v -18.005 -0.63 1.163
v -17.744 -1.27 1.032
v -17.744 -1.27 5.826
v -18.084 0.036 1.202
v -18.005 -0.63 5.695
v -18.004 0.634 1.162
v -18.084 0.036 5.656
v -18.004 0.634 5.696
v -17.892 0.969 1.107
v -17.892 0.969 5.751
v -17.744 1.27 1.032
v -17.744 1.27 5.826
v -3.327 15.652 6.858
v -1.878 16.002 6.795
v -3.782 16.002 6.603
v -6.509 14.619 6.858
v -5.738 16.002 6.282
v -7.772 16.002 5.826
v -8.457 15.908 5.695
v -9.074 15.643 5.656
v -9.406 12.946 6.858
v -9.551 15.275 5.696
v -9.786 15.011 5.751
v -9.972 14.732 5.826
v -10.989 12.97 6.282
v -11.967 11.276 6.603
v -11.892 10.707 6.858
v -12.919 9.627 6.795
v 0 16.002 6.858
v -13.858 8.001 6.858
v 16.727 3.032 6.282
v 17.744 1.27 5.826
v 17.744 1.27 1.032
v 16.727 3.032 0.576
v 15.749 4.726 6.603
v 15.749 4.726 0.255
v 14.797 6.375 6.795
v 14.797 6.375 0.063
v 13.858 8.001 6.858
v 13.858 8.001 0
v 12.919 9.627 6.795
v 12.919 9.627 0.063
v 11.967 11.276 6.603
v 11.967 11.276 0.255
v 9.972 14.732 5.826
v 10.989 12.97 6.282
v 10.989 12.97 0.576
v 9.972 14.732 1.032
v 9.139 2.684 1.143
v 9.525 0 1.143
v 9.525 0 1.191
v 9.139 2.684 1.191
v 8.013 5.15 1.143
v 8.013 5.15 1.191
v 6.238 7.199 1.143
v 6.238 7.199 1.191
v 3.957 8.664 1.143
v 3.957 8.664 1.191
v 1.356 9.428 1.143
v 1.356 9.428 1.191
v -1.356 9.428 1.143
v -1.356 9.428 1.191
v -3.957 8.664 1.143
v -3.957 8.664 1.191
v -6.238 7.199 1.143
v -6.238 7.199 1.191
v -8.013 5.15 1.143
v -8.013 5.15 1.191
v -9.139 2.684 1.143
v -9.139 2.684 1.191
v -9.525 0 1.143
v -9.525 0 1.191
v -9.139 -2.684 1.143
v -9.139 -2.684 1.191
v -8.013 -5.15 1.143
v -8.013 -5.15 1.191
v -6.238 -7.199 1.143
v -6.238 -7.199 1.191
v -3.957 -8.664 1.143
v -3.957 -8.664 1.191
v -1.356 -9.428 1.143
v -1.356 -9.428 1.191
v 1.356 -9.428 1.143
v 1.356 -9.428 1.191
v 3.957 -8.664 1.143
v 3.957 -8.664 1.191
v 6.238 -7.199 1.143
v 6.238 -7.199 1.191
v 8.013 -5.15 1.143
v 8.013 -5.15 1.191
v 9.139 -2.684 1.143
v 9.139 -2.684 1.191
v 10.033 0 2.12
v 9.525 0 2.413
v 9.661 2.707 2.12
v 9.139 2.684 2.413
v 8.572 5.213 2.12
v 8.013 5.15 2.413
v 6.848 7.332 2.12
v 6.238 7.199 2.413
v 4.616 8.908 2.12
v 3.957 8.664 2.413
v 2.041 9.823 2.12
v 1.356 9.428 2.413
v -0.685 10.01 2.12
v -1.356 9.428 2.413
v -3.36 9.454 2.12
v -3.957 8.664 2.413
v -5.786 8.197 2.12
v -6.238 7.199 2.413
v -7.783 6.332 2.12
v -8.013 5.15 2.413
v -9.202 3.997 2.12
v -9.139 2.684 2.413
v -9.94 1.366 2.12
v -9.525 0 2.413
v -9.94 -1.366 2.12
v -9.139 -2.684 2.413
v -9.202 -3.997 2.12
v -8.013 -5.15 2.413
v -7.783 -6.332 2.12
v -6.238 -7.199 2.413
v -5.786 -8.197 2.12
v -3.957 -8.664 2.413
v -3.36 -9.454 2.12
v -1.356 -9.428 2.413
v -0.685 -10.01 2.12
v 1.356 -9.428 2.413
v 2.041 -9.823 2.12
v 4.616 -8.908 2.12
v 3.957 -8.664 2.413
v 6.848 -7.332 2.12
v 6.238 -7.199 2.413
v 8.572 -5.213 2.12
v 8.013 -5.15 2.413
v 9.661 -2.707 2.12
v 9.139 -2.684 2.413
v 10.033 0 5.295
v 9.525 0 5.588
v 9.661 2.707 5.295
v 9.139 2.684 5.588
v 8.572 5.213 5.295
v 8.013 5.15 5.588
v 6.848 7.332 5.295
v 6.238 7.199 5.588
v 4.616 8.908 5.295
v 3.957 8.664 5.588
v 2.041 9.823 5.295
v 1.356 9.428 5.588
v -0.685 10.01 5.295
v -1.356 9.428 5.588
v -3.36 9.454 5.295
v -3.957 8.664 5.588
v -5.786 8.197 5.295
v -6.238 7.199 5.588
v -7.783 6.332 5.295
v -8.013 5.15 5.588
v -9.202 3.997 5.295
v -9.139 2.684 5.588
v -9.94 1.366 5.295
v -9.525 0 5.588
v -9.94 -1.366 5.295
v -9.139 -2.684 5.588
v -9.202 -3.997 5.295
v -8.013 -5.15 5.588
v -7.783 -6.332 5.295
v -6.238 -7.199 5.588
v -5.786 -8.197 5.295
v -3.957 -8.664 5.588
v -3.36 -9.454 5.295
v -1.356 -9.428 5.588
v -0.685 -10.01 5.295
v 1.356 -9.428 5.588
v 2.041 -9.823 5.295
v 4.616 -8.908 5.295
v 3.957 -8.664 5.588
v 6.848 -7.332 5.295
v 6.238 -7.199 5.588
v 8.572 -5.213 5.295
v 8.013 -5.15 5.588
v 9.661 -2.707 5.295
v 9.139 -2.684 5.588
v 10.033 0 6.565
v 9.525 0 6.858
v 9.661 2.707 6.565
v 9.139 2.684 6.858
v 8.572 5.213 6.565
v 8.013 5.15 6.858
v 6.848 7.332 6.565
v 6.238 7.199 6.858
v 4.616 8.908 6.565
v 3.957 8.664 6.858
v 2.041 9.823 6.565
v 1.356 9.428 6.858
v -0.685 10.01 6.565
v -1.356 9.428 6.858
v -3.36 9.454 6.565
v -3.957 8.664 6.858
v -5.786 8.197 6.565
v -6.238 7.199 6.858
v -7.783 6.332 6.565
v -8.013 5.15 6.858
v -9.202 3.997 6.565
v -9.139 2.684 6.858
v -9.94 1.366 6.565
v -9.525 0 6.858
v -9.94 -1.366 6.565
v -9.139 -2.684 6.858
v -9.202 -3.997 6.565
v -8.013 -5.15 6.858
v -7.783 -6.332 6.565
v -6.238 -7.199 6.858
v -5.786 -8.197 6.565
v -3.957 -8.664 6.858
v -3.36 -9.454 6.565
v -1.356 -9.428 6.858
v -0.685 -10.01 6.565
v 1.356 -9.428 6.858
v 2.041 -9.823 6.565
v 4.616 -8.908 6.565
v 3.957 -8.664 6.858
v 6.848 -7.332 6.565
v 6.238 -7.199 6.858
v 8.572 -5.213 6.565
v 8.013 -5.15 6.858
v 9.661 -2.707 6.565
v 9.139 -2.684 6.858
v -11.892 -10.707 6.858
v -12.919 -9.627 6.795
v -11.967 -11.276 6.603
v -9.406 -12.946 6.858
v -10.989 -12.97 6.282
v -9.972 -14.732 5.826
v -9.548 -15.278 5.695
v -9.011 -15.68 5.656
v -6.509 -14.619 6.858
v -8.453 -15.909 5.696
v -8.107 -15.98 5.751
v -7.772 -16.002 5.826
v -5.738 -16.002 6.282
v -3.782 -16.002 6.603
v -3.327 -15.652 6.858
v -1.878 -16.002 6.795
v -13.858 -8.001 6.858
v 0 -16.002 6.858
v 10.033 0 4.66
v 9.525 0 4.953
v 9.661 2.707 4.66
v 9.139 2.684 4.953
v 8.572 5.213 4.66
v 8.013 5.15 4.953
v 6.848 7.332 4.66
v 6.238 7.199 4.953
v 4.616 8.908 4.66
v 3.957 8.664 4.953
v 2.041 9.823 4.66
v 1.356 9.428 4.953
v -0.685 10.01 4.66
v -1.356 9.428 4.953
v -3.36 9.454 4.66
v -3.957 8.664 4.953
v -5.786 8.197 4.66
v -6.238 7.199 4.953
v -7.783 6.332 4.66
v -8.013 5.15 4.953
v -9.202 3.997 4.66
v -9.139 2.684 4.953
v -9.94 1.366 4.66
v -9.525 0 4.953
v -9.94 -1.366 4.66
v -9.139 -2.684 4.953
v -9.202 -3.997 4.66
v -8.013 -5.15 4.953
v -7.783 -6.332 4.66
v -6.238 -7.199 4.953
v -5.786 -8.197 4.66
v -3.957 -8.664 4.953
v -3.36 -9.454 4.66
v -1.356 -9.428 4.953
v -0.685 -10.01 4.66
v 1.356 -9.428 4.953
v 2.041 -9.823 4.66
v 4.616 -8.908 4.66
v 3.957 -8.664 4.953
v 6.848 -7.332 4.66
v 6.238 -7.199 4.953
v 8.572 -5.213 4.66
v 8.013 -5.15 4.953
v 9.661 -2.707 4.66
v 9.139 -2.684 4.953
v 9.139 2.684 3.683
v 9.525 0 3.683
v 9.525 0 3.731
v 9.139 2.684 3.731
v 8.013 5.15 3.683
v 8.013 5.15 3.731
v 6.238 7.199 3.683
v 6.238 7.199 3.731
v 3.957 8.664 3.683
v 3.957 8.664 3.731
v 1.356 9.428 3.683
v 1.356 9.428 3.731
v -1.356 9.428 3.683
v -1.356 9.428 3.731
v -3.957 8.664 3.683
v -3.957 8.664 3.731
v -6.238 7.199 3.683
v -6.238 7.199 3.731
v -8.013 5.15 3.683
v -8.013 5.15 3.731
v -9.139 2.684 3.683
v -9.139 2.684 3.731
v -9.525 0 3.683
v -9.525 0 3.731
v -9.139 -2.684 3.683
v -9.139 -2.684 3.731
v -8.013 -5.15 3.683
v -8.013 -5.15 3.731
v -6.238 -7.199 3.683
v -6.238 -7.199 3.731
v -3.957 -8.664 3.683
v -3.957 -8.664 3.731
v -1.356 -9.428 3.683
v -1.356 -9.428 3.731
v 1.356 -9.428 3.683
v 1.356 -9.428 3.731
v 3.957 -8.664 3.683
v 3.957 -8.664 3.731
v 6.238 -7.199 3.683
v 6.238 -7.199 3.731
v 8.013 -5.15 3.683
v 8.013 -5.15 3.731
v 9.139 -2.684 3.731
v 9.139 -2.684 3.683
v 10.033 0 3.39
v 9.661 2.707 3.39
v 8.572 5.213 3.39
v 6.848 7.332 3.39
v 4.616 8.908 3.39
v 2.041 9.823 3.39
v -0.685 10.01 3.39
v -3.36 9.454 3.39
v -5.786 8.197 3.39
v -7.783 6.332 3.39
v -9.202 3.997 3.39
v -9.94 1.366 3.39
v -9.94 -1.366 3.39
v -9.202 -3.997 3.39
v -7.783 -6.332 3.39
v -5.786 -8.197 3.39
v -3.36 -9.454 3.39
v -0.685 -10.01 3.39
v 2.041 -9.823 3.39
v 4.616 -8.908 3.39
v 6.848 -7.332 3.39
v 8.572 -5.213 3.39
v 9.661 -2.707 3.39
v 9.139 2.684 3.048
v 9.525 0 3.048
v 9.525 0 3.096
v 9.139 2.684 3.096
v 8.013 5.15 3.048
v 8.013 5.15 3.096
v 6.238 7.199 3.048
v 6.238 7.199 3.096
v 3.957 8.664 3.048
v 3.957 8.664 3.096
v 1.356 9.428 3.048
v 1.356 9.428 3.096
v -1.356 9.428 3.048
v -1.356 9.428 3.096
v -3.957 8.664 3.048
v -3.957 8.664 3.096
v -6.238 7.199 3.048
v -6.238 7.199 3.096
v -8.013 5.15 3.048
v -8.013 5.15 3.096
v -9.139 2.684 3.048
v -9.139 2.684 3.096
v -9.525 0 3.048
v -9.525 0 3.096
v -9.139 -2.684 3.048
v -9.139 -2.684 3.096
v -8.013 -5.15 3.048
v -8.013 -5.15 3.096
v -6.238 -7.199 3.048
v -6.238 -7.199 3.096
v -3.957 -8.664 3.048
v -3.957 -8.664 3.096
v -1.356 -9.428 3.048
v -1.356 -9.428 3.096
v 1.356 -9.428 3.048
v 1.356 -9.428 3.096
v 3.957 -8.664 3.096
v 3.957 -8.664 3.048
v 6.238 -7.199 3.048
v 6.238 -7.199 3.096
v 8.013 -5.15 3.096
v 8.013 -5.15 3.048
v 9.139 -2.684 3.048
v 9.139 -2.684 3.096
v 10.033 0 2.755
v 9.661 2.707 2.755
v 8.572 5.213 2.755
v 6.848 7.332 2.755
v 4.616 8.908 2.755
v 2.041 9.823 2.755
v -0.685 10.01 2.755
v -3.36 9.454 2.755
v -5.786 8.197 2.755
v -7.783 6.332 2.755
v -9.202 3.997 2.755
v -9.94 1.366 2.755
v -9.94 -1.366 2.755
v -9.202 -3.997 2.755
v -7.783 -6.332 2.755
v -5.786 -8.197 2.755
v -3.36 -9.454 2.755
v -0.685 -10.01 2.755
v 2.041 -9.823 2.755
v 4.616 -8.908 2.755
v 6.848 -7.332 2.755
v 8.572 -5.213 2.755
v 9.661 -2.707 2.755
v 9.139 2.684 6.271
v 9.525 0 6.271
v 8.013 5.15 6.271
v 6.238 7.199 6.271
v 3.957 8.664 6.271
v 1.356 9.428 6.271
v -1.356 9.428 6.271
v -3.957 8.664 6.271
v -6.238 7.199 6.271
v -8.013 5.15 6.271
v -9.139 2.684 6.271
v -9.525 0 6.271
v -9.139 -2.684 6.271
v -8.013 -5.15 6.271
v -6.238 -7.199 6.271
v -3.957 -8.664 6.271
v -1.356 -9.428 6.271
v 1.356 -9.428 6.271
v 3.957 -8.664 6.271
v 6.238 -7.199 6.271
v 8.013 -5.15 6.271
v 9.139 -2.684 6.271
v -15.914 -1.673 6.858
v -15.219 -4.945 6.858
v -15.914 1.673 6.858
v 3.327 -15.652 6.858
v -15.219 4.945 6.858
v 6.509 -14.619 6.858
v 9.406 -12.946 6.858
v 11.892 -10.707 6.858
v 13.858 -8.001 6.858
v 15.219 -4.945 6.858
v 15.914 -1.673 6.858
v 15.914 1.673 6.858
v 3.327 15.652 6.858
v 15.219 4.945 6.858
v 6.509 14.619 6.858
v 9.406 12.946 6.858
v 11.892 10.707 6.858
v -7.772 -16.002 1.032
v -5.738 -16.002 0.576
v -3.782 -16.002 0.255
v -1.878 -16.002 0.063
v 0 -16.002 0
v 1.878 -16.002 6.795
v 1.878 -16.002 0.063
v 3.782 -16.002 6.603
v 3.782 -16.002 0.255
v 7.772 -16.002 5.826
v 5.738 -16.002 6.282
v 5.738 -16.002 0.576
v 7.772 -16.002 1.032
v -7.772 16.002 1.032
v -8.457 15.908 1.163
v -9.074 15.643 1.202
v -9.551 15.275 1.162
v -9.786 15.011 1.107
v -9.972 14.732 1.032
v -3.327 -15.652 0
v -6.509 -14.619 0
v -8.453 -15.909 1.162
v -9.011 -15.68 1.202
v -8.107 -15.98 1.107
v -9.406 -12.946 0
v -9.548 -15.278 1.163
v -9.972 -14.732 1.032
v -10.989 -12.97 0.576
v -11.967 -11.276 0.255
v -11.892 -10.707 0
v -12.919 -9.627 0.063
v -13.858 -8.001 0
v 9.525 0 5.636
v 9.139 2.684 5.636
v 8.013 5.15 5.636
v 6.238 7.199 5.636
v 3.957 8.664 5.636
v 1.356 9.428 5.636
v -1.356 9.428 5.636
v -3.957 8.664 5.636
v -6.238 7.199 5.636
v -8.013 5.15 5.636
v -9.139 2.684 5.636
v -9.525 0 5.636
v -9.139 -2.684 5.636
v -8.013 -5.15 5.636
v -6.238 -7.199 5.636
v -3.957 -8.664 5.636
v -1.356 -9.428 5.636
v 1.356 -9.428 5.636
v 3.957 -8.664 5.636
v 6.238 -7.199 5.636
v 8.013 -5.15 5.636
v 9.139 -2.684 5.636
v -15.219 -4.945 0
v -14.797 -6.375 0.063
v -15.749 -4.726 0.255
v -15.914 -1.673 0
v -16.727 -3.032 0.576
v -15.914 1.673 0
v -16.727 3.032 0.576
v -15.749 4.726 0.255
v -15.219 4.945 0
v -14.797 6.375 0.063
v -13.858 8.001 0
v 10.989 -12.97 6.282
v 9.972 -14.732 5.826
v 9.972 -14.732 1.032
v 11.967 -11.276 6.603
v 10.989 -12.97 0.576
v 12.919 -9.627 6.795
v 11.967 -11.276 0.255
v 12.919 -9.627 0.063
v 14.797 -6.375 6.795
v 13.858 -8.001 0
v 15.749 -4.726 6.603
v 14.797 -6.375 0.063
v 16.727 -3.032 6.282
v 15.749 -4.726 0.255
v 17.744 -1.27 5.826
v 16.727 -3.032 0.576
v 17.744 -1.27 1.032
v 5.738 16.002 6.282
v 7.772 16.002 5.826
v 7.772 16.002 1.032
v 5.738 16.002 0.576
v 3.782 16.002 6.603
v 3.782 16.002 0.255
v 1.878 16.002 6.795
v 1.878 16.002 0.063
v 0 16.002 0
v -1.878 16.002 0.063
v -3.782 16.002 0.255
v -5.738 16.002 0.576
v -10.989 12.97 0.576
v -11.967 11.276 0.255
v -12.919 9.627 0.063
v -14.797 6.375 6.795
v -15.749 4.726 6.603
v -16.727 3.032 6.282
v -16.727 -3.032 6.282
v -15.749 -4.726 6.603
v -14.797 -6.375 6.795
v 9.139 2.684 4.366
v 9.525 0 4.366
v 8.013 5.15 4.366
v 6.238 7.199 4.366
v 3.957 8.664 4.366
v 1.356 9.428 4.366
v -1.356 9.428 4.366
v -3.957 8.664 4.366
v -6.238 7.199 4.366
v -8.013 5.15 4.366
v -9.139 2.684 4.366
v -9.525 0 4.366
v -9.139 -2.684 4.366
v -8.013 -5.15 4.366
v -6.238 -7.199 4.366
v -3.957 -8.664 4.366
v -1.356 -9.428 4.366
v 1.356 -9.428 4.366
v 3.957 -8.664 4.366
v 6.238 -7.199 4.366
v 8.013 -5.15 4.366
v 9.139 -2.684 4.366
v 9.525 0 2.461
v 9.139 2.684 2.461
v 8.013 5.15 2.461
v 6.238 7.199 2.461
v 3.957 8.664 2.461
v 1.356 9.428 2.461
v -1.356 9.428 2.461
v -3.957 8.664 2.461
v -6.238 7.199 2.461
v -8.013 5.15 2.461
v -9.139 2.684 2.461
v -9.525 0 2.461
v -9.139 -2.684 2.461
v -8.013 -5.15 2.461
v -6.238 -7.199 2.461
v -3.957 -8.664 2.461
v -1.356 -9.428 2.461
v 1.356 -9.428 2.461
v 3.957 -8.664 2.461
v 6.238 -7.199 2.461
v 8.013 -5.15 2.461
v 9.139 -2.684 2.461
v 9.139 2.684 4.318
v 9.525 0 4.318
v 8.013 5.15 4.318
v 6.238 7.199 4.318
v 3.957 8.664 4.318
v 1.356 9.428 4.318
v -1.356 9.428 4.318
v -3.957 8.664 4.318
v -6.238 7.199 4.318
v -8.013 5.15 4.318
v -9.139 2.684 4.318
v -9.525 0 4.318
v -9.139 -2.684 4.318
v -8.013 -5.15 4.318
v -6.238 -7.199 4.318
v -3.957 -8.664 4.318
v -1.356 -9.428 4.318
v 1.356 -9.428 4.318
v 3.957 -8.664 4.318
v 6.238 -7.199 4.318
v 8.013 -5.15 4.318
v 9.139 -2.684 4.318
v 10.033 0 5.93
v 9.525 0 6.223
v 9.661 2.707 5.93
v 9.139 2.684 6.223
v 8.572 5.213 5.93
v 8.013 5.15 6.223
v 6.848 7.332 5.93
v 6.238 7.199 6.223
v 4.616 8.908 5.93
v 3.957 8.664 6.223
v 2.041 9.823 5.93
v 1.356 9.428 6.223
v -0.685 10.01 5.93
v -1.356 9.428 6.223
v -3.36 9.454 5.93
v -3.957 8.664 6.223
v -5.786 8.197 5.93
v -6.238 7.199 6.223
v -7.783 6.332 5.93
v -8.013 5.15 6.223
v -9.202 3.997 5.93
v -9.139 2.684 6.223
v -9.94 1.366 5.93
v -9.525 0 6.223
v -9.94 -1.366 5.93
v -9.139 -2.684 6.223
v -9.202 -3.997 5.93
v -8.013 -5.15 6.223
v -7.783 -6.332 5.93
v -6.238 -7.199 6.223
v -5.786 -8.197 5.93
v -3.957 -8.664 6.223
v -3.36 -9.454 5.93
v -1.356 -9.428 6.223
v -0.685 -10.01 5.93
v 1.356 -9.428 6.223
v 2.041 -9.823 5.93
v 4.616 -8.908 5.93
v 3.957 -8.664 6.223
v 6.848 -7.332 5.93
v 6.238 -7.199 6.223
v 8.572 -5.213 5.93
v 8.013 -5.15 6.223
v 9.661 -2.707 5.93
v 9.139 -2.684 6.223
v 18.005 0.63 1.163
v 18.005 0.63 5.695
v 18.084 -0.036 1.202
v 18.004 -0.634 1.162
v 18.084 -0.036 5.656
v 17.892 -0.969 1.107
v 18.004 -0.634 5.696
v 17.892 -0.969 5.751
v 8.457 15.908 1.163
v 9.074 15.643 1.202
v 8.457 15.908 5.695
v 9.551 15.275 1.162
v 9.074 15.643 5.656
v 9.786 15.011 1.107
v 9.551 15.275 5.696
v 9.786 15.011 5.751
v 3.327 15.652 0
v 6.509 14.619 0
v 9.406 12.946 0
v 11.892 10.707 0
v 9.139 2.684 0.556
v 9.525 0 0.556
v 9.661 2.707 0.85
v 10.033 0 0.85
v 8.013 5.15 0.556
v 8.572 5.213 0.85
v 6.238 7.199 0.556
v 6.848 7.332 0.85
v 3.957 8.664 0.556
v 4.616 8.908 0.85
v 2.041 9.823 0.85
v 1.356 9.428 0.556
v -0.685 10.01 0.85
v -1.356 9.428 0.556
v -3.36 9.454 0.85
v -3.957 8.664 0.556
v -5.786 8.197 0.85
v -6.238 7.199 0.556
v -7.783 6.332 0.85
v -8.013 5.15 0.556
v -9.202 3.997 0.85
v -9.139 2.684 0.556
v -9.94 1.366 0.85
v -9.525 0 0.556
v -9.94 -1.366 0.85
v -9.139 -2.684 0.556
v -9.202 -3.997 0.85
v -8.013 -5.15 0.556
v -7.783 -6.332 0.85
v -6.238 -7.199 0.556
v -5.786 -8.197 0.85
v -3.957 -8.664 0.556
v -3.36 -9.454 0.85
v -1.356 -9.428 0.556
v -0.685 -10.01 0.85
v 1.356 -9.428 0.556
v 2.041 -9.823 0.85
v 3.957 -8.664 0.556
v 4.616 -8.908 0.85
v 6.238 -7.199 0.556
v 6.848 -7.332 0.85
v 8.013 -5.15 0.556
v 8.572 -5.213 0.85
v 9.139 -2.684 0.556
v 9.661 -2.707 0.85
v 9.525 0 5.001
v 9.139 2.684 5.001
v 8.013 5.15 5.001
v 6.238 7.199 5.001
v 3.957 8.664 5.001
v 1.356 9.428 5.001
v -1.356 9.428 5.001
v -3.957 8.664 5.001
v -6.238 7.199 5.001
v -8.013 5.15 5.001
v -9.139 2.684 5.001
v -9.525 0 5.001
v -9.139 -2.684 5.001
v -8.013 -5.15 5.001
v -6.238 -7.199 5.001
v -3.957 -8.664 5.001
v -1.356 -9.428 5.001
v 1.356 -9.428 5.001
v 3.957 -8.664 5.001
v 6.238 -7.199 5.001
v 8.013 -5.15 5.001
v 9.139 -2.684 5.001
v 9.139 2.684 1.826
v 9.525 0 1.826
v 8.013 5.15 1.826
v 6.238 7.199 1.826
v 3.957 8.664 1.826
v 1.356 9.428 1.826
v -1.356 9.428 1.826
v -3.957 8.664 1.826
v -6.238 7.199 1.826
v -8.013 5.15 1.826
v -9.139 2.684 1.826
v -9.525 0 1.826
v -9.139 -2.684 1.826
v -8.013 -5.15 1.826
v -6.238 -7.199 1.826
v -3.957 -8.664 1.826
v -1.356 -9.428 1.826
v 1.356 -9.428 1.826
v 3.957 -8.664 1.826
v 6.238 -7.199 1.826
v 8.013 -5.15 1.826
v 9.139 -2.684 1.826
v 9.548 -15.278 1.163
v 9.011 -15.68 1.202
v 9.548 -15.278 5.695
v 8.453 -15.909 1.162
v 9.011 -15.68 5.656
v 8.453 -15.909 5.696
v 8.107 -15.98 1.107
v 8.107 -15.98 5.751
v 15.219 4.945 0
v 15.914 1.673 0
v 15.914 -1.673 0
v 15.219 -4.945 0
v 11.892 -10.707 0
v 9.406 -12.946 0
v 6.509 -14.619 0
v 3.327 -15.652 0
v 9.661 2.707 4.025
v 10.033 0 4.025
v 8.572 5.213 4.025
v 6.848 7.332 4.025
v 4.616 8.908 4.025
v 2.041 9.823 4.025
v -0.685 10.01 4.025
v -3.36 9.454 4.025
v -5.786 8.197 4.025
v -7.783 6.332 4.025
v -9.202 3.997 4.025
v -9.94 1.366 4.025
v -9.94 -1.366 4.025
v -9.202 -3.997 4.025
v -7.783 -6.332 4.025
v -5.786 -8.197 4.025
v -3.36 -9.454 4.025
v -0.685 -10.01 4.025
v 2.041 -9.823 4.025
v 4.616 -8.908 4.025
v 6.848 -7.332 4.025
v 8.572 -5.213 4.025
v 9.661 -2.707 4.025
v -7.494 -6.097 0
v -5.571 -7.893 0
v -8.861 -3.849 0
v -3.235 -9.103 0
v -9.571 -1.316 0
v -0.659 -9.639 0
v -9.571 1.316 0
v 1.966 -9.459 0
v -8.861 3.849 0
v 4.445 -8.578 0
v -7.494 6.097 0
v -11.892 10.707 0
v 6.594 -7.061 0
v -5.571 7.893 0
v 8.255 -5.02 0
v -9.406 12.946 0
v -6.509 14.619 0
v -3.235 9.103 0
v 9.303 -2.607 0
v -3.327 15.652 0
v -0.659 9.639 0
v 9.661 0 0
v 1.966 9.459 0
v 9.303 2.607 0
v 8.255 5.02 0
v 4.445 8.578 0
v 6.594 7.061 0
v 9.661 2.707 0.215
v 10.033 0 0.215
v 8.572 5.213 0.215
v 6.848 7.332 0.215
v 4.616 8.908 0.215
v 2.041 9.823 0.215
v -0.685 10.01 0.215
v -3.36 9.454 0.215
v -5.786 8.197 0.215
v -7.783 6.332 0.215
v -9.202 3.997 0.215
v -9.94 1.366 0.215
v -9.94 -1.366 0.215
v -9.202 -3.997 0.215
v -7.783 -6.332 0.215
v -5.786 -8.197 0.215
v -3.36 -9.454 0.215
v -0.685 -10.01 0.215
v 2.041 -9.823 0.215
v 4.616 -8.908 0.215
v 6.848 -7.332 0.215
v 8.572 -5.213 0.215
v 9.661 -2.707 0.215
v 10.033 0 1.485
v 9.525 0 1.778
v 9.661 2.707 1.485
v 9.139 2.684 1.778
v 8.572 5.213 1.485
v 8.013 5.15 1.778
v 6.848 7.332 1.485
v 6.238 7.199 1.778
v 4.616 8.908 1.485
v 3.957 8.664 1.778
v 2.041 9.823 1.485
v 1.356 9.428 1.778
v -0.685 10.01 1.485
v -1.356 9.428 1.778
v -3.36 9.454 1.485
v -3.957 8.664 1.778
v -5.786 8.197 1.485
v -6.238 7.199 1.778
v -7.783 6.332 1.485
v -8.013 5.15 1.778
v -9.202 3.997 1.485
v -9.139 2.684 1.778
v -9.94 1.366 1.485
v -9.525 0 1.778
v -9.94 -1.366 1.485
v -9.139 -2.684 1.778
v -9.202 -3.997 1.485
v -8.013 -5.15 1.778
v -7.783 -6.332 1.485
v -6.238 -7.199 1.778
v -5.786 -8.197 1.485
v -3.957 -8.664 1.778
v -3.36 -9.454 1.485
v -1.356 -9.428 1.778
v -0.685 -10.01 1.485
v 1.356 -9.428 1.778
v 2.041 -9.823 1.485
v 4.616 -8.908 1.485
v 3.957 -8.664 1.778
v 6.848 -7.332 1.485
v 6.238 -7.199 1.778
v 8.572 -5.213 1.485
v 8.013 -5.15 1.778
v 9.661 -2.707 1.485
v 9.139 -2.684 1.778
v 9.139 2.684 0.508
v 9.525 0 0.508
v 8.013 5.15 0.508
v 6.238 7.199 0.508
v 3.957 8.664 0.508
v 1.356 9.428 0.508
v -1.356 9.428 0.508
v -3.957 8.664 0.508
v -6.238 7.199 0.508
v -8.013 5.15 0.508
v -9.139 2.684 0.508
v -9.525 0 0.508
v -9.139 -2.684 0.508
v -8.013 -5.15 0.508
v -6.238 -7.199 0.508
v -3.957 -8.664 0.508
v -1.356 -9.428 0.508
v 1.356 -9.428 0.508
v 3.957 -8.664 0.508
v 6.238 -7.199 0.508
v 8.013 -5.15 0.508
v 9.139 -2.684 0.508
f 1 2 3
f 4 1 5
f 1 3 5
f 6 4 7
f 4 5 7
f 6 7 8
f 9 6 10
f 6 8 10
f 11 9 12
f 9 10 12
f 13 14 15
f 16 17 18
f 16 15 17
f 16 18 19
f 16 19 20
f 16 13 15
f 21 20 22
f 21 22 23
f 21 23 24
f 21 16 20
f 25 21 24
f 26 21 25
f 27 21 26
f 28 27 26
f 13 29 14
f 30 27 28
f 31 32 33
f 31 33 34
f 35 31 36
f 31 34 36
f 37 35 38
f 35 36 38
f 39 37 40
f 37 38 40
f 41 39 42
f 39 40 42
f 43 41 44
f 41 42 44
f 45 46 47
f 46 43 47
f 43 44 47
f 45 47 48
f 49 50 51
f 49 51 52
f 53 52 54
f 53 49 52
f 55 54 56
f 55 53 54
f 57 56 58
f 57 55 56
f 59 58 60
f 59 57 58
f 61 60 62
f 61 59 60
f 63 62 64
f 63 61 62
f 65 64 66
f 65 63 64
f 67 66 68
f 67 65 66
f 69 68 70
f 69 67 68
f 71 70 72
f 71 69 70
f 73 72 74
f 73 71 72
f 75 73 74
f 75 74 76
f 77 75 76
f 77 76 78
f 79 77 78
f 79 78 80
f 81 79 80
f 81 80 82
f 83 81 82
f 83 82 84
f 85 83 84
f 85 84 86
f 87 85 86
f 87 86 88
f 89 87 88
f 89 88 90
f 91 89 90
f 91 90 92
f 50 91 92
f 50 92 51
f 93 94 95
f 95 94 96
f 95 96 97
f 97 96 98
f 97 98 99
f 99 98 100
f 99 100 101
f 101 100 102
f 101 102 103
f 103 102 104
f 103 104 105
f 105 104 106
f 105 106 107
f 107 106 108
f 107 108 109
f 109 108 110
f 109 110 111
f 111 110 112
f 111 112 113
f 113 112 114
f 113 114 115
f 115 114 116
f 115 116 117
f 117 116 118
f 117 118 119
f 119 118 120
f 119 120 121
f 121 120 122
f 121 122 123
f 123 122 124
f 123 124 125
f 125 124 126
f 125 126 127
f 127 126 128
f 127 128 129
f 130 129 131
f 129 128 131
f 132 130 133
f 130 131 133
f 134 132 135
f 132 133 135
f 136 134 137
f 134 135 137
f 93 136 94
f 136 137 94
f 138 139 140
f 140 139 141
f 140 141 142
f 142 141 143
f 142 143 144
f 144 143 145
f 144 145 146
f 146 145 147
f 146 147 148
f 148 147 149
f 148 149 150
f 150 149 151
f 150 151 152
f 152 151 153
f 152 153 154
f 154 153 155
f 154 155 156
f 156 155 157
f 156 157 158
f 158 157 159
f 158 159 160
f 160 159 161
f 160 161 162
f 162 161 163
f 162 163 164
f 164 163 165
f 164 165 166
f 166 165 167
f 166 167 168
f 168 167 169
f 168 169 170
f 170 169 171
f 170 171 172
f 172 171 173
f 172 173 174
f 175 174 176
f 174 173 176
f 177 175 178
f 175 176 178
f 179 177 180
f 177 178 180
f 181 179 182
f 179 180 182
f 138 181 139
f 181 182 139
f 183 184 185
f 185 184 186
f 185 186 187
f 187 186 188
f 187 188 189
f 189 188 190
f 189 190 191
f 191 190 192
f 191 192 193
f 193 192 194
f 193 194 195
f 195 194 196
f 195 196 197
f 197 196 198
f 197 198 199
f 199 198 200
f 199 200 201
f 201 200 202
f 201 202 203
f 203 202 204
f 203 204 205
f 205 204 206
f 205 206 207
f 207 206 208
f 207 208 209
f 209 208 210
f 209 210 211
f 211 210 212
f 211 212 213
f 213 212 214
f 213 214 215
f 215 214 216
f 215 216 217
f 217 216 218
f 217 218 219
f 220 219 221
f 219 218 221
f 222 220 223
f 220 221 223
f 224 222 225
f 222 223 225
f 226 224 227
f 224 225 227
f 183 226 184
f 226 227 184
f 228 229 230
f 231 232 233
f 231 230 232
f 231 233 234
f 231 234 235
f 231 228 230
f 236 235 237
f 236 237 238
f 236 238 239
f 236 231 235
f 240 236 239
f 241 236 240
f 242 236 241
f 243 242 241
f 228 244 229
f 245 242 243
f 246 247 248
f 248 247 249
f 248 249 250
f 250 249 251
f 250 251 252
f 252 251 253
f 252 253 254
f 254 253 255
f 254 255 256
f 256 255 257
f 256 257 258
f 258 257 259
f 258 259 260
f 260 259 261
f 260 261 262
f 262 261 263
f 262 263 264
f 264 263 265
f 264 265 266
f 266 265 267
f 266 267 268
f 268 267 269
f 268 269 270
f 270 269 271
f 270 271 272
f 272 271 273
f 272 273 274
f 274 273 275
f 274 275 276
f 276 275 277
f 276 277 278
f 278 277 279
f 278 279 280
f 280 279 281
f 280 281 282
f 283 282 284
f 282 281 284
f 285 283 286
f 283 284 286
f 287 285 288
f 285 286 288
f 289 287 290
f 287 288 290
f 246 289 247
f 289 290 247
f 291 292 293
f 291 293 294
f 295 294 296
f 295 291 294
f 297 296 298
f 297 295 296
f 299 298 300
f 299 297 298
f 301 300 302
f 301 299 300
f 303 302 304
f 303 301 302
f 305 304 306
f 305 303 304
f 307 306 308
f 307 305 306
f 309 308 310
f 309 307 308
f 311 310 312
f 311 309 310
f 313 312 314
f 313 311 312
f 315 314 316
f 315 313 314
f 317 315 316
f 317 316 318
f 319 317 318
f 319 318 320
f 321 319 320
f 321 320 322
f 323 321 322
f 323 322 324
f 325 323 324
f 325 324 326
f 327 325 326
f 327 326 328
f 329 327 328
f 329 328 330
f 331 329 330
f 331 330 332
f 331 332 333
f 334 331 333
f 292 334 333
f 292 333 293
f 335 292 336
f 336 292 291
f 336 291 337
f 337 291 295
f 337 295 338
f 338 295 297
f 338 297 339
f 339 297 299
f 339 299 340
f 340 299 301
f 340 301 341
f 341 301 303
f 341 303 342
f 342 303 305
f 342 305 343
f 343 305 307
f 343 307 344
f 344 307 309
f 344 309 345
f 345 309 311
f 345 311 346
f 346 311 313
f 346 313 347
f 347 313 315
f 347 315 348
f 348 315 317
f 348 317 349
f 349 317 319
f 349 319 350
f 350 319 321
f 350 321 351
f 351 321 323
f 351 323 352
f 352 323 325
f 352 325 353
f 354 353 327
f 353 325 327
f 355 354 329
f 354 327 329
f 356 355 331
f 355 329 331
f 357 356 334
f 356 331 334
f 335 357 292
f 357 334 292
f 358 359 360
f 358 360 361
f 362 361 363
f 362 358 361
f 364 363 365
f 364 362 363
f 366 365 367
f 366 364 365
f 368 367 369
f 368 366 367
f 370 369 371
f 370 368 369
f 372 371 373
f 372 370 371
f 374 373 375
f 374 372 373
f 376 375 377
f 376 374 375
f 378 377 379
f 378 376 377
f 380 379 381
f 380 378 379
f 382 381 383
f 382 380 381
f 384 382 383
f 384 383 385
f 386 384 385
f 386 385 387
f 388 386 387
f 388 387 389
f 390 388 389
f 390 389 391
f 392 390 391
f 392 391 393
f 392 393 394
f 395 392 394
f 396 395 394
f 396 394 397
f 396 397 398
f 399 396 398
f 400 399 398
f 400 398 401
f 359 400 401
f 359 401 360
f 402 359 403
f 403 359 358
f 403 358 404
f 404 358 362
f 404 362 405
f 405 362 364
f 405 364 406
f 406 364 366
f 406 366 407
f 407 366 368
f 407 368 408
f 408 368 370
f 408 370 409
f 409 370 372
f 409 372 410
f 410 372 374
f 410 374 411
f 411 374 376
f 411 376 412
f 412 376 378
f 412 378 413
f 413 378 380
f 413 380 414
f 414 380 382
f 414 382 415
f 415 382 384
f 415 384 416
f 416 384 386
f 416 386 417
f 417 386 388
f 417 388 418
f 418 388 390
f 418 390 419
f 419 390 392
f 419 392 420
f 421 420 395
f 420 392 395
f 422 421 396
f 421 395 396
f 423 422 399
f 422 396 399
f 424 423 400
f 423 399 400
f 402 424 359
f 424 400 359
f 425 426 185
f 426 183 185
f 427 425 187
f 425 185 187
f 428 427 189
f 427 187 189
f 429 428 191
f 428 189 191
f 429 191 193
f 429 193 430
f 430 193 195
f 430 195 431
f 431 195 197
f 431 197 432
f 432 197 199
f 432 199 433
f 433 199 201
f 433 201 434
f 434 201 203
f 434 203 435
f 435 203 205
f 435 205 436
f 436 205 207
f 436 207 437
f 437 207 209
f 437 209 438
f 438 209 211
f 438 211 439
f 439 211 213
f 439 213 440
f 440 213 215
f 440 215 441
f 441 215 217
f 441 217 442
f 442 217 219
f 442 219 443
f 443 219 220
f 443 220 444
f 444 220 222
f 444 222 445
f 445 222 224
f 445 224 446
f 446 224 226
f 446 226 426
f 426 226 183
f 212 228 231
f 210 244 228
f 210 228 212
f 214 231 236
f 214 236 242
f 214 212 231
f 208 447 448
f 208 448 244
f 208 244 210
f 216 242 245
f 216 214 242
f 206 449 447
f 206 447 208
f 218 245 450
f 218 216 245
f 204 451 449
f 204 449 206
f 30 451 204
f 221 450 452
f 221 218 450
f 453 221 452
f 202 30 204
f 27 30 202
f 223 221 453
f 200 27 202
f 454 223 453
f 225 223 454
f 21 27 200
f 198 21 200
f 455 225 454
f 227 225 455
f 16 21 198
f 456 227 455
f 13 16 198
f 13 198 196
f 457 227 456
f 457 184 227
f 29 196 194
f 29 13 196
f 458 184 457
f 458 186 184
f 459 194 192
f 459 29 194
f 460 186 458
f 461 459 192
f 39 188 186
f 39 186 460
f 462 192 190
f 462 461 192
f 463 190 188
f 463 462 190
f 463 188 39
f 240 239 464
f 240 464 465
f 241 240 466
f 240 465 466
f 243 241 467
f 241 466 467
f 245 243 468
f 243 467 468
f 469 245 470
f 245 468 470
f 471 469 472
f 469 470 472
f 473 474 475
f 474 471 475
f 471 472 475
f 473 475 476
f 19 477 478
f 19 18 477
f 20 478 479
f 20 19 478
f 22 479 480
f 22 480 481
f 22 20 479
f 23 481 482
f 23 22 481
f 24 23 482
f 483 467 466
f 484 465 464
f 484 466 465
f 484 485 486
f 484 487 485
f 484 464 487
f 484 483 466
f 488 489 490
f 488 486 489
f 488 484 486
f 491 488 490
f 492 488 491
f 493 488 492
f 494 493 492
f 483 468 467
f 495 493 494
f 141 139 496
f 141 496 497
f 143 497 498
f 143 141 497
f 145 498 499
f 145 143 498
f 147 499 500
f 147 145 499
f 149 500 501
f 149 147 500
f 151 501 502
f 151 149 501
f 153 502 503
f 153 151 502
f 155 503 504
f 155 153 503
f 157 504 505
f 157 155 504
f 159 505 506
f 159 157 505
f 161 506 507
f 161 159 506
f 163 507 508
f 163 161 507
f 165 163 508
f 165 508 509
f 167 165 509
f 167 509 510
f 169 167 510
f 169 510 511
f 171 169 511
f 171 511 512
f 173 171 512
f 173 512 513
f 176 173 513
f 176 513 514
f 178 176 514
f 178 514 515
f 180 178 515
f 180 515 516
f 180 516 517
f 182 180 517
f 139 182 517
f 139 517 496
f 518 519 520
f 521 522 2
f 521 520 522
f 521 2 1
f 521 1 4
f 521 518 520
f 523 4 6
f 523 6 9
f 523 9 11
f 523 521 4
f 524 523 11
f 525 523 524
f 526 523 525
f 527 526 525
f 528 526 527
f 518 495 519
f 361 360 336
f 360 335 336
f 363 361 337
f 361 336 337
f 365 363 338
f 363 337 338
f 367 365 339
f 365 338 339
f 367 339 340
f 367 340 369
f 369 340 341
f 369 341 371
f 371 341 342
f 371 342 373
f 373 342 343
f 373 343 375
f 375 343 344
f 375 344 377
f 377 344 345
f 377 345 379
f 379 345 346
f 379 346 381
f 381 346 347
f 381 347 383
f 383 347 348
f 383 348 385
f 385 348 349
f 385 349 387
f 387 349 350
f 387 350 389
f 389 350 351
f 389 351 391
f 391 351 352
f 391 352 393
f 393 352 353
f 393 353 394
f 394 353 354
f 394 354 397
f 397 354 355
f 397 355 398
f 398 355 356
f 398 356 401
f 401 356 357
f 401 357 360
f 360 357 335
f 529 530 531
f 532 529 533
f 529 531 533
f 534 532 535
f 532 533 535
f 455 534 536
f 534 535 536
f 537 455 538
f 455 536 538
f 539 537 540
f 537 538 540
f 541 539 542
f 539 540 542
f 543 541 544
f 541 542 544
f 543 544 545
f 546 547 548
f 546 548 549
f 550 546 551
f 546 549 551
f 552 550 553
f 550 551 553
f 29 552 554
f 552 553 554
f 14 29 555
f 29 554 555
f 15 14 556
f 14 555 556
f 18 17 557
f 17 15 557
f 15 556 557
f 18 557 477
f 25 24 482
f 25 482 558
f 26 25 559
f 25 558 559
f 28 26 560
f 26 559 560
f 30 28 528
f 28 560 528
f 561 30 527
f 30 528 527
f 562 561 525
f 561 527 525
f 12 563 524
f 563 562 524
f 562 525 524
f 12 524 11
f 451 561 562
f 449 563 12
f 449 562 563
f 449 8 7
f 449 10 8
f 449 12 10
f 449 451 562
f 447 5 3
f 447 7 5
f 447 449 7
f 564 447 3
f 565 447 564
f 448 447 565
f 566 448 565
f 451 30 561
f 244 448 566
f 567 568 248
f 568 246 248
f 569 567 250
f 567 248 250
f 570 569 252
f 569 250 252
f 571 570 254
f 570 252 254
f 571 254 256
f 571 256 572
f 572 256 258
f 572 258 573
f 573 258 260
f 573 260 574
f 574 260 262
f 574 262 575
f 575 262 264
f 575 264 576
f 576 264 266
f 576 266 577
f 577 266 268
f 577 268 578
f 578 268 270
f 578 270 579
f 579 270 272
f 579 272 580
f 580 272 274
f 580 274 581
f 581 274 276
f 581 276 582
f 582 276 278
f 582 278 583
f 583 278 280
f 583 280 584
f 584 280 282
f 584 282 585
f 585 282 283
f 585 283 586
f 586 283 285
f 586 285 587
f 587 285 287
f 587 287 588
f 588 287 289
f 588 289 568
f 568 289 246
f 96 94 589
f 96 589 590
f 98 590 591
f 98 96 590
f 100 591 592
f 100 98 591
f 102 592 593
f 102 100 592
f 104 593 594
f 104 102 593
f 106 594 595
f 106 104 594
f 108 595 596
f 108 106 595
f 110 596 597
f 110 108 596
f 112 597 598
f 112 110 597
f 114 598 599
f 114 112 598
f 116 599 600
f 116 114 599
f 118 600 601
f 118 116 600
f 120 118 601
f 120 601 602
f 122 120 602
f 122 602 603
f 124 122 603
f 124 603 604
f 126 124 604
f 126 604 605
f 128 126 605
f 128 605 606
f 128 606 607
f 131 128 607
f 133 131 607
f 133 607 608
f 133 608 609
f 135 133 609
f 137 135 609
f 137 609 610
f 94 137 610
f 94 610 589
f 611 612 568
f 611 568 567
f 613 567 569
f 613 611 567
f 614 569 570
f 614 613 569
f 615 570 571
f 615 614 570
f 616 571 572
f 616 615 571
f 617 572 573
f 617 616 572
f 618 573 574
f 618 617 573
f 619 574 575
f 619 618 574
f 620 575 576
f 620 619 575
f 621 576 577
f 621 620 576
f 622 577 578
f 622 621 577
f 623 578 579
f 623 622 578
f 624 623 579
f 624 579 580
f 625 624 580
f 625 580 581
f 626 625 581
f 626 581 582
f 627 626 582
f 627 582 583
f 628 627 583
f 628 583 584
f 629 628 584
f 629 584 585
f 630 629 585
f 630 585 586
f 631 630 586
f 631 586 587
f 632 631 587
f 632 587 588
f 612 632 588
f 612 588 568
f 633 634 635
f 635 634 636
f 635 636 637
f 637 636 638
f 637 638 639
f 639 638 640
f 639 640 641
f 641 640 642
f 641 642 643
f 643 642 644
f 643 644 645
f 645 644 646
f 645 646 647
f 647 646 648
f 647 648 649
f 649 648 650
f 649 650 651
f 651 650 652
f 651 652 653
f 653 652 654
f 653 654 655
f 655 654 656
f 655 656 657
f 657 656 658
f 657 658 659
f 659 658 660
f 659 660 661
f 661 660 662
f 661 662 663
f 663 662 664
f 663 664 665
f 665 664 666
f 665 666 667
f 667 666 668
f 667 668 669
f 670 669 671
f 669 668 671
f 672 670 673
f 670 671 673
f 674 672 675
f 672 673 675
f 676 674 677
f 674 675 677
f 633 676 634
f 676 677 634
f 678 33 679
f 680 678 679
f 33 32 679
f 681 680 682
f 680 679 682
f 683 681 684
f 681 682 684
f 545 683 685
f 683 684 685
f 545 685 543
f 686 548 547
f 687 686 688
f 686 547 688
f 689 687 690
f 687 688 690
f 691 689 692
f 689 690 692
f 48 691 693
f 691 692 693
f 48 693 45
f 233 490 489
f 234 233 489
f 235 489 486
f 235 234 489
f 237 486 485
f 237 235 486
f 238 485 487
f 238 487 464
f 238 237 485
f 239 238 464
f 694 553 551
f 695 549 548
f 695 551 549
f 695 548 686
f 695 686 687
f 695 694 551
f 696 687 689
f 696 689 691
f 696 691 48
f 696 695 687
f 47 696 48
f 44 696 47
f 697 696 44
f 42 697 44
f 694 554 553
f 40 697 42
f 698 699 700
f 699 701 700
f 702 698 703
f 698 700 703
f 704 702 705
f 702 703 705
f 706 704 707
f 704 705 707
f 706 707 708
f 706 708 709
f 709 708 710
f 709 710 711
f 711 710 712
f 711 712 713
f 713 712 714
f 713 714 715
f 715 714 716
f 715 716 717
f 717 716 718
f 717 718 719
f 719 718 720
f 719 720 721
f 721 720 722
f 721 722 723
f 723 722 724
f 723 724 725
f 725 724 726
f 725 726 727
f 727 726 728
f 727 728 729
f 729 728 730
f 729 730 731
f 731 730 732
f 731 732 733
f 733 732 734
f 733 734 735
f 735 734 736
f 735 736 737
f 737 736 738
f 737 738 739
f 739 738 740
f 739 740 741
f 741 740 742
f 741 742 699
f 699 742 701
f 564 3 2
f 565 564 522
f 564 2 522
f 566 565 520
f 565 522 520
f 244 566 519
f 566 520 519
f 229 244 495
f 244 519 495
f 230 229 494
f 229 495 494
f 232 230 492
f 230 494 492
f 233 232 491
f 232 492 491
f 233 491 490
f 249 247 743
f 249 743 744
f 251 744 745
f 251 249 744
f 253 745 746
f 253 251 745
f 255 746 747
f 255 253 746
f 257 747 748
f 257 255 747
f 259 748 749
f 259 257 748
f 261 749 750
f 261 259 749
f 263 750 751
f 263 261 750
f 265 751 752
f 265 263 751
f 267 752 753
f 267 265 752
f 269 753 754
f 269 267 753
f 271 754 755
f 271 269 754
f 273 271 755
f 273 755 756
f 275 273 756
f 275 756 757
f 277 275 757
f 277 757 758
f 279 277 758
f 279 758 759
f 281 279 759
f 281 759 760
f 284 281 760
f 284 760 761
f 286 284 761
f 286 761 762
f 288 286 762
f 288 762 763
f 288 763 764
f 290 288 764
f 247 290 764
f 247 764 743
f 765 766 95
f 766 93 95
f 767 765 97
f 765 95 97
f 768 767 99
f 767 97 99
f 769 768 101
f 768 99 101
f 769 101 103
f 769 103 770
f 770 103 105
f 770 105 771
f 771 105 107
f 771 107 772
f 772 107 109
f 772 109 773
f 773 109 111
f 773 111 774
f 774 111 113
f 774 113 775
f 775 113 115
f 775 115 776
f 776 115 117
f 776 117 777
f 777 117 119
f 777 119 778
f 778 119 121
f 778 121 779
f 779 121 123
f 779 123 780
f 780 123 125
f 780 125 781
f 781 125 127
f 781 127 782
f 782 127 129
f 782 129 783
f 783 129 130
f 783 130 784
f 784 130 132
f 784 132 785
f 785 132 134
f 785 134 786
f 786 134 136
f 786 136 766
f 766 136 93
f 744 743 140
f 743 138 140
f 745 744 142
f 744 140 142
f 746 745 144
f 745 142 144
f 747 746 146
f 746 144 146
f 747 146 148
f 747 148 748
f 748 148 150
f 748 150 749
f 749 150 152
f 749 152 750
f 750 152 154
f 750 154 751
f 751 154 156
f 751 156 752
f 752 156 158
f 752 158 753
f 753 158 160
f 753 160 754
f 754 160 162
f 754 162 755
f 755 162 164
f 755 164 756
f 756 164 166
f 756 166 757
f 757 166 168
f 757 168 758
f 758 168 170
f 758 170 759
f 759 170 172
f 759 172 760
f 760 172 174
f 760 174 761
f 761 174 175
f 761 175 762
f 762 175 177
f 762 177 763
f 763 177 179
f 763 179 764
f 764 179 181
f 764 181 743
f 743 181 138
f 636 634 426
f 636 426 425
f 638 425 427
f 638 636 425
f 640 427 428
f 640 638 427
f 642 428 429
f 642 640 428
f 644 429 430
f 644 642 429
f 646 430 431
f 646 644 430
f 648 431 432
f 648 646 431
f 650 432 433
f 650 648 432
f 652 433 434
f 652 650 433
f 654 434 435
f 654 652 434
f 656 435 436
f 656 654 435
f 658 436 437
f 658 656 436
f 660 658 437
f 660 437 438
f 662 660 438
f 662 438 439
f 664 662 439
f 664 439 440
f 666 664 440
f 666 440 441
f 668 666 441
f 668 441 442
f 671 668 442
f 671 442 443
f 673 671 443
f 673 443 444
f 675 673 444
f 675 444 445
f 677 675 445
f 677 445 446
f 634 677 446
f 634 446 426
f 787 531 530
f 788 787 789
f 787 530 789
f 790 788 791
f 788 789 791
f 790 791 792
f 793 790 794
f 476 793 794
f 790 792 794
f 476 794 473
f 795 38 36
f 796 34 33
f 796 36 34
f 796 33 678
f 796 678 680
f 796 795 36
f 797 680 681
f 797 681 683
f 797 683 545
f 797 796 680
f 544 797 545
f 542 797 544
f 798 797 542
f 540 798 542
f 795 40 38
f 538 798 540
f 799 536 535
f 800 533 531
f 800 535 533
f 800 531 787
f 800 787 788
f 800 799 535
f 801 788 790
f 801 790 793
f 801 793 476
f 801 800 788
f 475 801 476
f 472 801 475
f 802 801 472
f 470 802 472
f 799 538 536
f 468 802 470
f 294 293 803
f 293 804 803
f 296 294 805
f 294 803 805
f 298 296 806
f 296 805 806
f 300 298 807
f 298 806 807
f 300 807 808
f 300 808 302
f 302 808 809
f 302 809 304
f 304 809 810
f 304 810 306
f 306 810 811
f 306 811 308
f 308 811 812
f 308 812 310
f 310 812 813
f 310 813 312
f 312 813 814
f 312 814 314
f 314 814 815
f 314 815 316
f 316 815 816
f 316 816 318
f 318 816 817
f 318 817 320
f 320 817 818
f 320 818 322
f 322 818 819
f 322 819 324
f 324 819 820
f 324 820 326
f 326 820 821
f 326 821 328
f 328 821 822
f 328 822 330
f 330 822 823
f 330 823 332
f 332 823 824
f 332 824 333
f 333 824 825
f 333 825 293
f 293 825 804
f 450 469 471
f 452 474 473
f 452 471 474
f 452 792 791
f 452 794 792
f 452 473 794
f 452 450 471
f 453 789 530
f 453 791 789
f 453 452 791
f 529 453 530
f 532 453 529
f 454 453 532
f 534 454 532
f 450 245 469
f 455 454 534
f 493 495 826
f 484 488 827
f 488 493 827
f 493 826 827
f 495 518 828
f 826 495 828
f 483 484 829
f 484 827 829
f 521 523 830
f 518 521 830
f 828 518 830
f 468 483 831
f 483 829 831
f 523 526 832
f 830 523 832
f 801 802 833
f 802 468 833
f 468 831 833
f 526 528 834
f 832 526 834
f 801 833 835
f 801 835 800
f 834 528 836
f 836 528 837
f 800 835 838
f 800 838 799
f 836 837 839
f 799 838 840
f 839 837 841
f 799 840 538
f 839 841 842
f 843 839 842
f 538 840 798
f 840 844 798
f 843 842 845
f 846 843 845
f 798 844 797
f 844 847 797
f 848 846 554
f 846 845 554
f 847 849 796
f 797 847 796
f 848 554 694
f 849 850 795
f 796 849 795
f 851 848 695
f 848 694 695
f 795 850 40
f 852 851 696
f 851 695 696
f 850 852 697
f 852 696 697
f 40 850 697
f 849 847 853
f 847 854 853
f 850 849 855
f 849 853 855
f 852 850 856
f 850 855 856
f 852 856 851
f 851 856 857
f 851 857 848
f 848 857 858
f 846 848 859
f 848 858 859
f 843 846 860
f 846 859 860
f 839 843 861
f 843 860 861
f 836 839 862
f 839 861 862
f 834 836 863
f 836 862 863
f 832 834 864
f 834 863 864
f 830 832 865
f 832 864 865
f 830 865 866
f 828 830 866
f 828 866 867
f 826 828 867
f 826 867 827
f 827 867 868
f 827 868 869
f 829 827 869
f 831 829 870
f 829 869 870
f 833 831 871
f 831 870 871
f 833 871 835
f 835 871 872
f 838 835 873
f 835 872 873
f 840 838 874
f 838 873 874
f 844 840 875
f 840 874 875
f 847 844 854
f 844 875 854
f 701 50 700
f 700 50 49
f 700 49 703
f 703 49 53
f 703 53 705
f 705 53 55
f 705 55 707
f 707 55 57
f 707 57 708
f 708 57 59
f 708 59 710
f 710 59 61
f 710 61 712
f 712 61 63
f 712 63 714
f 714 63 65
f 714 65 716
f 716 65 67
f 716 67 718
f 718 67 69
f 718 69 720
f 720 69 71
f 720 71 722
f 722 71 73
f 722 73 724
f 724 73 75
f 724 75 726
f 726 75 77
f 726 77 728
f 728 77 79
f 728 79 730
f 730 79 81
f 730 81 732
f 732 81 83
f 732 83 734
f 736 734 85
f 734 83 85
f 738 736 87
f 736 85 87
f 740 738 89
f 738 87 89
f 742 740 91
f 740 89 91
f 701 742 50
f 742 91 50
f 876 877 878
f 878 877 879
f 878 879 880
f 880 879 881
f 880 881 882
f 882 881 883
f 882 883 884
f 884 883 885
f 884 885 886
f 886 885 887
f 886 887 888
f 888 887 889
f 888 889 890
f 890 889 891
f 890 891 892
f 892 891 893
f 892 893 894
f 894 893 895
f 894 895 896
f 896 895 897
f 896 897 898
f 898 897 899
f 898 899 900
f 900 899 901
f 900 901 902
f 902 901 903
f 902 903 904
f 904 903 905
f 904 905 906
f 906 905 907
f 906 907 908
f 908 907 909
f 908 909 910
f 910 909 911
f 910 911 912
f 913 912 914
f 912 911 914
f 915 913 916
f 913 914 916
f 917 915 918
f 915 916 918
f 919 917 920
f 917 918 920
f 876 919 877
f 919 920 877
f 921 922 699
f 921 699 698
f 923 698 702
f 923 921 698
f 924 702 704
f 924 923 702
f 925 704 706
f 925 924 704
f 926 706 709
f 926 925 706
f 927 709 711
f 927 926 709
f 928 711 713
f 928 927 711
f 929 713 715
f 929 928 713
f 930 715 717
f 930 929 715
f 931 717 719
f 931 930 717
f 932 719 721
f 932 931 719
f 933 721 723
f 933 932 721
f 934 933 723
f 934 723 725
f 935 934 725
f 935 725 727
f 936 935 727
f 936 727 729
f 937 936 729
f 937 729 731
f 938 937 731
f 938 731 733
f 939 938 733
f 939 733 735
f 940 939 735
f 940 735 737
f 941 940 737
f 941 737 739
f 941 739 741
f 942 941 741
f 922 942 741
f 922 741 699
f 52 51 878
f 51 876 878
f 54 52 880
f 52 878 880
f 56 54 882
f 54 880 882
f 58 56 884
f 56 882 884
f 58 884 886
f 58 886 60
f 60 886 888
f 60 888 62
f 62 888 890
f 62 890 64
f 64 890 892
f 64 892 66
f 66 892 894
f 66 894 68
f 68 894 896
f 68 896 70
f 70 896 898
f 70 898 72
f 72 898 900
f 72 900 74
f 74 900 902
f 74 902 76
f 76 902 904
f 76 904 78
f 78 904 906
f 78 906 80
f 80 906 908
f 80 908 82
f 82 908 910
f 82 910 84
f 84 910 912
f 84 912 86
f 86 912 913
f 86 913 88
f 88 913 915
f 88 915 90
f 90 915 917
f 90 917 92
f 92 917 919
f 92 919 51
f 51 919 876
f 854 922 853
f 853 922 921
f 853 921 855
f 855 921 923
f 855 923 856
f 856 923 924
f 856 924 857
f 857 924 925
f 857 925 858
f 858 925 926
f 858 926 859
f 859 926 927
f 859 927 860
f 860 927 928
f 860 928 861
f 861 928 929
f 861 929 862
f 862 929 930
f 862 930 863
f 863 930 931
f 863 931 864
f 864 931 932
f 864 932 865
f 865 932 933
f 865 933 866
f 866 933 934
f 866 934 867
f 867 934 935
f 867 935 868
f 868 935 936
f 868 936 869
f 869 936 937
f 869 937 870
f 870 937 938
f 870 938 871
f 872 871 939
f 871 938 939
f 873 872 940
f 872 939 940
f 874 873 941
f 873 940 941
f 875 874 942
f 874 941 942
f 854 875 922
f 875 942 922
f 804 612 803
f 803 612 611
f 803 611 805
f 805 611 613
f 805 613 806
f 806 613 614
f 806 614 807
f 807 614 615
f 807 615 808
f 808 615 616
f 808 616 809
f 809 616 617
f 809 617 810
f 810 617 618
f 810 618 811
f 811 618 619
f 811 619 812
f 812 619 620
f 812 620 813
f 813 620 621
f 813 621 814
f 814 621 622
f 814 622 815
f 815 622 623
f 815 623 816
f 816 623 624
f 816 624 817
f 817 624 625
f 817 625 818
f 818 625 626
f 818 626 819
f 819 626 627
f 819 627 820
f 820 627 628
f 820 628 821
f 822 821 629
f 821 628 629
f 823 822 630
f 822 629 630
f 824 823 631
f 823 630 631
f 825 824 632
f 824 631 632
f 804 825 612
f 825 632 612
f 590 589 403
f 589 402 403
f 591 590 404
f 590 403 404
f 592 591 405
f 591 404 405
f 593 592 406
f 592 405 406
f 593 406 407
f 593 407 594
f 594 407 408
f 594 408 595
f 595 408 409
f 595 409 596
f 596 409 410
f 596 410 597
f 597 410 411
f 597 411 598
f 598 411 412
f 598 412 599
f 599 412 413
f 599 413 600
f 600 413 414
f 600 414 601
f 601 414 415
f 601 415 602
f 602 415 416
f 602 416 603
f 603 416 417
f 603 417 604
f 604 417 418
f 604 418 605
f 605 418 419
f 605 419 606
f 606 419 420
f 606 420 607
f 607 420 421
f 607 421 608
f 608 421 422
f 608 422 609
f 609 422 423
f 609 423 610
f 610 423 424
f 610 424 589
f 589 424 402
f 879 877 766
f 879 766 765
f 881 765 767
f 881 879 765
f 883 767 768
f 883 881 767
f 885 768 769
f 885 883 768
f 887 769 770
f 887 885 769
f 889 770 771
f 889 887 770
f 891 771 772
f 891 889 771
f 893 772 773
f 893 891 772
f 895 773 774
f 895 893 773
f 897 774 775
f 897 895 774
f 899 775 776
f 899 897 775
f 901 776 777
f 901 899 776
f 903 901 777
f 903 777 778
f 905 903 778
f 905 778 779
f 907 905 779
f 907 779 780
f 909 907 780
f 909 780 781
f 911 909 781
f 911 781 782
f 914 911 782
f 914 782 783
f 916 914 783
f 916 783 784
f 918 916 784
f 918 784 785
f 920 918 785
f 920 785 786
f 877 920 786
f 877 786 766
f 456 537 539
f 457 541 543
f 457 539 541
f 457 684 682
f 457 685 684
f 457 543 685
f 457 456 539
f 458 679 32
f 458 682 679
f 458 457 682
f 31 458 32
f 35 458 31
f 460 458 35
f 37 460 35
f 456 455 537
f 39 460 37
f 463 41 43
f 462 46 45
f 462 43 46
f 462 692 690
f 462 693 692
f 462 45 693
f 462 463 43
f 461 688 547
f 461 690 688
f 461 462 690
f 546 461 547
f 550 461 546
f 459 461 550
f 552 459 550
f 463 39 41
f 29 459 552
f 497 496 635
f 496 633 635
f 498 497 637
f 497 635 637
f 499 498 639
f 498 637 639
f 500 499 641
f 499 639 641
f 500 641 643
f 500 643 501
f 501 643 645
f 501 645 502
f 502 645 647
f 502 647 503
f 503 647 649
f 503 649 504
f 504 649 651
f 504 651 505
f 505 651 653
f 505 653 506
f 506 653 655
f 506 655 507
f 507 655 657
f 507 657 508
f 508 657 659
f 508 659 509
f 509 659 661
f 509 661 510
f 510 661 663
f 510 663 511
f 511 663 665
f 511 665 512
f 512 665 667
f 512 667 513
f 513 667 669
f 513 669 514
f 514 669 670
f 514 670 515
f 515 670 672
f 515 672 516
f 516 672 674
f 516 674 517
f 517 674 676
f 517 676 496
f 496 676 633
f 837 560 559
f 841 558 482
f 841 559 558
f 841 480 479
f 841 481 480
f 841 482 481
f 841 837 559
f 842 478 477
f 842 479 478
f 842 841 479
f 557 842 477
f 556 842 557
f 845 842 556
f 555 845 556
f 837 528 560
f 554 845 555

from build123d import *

# Parameters (mm, degrees)
SKETCH1_R          = 9.525
EXTRUDE1_DEPTH     = 6.858
SKETCH2_OUTSIDE_W  = 76.05
SKETCH2_OUTSIDE_H  = 71.098
SKETCH2_OUTSIDE_R  = 16.002
CUT_EXTRUDE1_DEPTH = 7.858
CUT_EXTRUDE1_DRAFT = -60
SKETCH3_OUTSIDE_W  = 76.05
SKETCH3_OUTSIDE_H  = 71.098
SKETCH3_OUTSIDE_R  = 16.002
CUT_EXTRUDE2_DEPTH = 7.858
CUT_EXTRUDE2_DRAFT = -60
FILLET1_R          = 2.54
LPATTERN1_COUNT    = 11
LPATTERN1_PITCH    = 0.635


with BuildPart() as part:
    # Sketch1 → Extrude1 (new body)
    with BuildSketch(Plane.XY):
        Polygon((-18.477518015, 0), (-9.238759008, -16.002), (9.238759008, -16.002), (18.477518015, 0), (9.238759008, 16.002), (-9.238759008, 16.002), align=None)
        Circle(SKETCH1_R, mode=Mode.SUBTRACT)
    extrude(amount=EXTRUDE1_DEPTH)


with BuildPart() as cut_extrude1_tool:
    # Sketch2 outside → Cut-Extrude1 (with draft: the straight prism first)
    with BuildSketch(Plane.XY.offset(6.858)):
        Rectangle(SKETCH2_OUTSIDE_W, SKETCH2_OUTSIDE_H)
        Circle(SKETCH2_OUTSIDE_R, mode=Mode.SUBTRACT)
    extrude(amount=-CUT_EXTRUDE1_DEPTH)
    # Cut-Extrude1: the draft: its side faces are tilted about the plane it starts from
    cut_extrude1_sides = [cut_extrude1_tool.faces().sort_by_distance(p)[0] for p in [
        (0, -35.549, 2.929),
        (38.025, 0, 2.929),
        (0, 35.549, 2.929),
        (-38.025, 0, 2.929),
        (-16.002, 0, 2.929),
    ]]
    draft(cut_extrude1_sides, Plane.XY.offset(6.858), CUT_EXTRUDE1_DRAFT)


with BuildPart() as part_1:
    add(part.part)

    # Cut-Extrude1: cut by cut_extrude1_tool
    add(cut_extrude1_tool.part, mode=Mode.SUBTRACT)


with BuildPart() as cut_extrude2_tool:
    # Sketch3 outside → Cut-Extrude2 (with draft: the straight prism first)
    with BuildSketch(Plane(origin=(0, 0, 0), x_dir=(-1, 0, 0), z_dir=(0, 0, -1))):
        Rectangle(SKETCH3_OUTSIDE_W, SKETCH3_OUTSIDE_H)
        Circle(SKETCH3_OUTSIDE_R, mode=Mode.SUBTRACT)
    extrude(amount=-CUT_EXTRUDE2_DEPTH)
    # Cut-Extrude2: the draft: its side faces are tilted about the plane it starts from
    cut_extrude2_sides = [cut_extrude2_tool.faces().sort_by_distance(p)[0] for p in [
        (0, -35.549, 3.929),
        (-38.025, 0, 3.929),
        (0, 35.549, 3.929),
        (38.025, 0, 3.929),
        (16.002, 0, 3.929),
    ]]
    draft(cut_extrude2_sides, Plane(origin=(0, 0, 0), x_dir=(-1, 0, 0), z_dir=(0, 0, -1)), CUT_EXTRUDE2_DRAFT)


with BuildPart() as part_2:
    add(part_1.part)

    # Cut-Extrude2: cut by cut_extrude2_tool
    add(cut_extrude2_tool.part, mode=Mode.SUBTRACT)

    # Fillet1
    fillet1_edges = [part_2.edges().sort_by_distance(p)[0] for p in [
        (18.477518015, 0, 3.429),
        (9.238759008, -16.002, 3.429),
        (-9.238759008, -16.002, 3.429),
        (-18.477518015, 0, 3.429),
        (-9.238759008, 16.002, 3.429),
        (9.238759008, 16.002, 3.429),
    ]]
    fillet(fillet1_edges, radius=FILLET1_R)

    # Sketch4 → Cut-Revolve1 (revolve, cut)
    with BuildSketch(Plane(origin=(0, 0, 0), x_dir=(1, 0, 0), z_dir=(0, 1, 0)), mode=Mode.PRIVATE) as cut_revolve1_sk:
        Polygon((-9.525, -6.858), (-9.525, -6.271412127), (-10.033, -6.564706063), align=None)
    cut_revolve1 = revolve(cut_revolve1_sk.sketch.rotate(Axis((0, 0, 0), (0, 0, 1)), 180), axis=Axis((0, 0, 0), (0, 0, 1)), mode=Mode.SUBTRACT)  # turned: the seam where the file's is

    # LPattern1: Cut-Revolve1 ×11
    with Locations(*[(0, 0, -i * LPATTERN1_PITCH) for i in range(1, LPATTERN1_COUNT)]):
        add(cut_revolve1, mode=Mode.SUBTRACT)


solid = part_2.part
